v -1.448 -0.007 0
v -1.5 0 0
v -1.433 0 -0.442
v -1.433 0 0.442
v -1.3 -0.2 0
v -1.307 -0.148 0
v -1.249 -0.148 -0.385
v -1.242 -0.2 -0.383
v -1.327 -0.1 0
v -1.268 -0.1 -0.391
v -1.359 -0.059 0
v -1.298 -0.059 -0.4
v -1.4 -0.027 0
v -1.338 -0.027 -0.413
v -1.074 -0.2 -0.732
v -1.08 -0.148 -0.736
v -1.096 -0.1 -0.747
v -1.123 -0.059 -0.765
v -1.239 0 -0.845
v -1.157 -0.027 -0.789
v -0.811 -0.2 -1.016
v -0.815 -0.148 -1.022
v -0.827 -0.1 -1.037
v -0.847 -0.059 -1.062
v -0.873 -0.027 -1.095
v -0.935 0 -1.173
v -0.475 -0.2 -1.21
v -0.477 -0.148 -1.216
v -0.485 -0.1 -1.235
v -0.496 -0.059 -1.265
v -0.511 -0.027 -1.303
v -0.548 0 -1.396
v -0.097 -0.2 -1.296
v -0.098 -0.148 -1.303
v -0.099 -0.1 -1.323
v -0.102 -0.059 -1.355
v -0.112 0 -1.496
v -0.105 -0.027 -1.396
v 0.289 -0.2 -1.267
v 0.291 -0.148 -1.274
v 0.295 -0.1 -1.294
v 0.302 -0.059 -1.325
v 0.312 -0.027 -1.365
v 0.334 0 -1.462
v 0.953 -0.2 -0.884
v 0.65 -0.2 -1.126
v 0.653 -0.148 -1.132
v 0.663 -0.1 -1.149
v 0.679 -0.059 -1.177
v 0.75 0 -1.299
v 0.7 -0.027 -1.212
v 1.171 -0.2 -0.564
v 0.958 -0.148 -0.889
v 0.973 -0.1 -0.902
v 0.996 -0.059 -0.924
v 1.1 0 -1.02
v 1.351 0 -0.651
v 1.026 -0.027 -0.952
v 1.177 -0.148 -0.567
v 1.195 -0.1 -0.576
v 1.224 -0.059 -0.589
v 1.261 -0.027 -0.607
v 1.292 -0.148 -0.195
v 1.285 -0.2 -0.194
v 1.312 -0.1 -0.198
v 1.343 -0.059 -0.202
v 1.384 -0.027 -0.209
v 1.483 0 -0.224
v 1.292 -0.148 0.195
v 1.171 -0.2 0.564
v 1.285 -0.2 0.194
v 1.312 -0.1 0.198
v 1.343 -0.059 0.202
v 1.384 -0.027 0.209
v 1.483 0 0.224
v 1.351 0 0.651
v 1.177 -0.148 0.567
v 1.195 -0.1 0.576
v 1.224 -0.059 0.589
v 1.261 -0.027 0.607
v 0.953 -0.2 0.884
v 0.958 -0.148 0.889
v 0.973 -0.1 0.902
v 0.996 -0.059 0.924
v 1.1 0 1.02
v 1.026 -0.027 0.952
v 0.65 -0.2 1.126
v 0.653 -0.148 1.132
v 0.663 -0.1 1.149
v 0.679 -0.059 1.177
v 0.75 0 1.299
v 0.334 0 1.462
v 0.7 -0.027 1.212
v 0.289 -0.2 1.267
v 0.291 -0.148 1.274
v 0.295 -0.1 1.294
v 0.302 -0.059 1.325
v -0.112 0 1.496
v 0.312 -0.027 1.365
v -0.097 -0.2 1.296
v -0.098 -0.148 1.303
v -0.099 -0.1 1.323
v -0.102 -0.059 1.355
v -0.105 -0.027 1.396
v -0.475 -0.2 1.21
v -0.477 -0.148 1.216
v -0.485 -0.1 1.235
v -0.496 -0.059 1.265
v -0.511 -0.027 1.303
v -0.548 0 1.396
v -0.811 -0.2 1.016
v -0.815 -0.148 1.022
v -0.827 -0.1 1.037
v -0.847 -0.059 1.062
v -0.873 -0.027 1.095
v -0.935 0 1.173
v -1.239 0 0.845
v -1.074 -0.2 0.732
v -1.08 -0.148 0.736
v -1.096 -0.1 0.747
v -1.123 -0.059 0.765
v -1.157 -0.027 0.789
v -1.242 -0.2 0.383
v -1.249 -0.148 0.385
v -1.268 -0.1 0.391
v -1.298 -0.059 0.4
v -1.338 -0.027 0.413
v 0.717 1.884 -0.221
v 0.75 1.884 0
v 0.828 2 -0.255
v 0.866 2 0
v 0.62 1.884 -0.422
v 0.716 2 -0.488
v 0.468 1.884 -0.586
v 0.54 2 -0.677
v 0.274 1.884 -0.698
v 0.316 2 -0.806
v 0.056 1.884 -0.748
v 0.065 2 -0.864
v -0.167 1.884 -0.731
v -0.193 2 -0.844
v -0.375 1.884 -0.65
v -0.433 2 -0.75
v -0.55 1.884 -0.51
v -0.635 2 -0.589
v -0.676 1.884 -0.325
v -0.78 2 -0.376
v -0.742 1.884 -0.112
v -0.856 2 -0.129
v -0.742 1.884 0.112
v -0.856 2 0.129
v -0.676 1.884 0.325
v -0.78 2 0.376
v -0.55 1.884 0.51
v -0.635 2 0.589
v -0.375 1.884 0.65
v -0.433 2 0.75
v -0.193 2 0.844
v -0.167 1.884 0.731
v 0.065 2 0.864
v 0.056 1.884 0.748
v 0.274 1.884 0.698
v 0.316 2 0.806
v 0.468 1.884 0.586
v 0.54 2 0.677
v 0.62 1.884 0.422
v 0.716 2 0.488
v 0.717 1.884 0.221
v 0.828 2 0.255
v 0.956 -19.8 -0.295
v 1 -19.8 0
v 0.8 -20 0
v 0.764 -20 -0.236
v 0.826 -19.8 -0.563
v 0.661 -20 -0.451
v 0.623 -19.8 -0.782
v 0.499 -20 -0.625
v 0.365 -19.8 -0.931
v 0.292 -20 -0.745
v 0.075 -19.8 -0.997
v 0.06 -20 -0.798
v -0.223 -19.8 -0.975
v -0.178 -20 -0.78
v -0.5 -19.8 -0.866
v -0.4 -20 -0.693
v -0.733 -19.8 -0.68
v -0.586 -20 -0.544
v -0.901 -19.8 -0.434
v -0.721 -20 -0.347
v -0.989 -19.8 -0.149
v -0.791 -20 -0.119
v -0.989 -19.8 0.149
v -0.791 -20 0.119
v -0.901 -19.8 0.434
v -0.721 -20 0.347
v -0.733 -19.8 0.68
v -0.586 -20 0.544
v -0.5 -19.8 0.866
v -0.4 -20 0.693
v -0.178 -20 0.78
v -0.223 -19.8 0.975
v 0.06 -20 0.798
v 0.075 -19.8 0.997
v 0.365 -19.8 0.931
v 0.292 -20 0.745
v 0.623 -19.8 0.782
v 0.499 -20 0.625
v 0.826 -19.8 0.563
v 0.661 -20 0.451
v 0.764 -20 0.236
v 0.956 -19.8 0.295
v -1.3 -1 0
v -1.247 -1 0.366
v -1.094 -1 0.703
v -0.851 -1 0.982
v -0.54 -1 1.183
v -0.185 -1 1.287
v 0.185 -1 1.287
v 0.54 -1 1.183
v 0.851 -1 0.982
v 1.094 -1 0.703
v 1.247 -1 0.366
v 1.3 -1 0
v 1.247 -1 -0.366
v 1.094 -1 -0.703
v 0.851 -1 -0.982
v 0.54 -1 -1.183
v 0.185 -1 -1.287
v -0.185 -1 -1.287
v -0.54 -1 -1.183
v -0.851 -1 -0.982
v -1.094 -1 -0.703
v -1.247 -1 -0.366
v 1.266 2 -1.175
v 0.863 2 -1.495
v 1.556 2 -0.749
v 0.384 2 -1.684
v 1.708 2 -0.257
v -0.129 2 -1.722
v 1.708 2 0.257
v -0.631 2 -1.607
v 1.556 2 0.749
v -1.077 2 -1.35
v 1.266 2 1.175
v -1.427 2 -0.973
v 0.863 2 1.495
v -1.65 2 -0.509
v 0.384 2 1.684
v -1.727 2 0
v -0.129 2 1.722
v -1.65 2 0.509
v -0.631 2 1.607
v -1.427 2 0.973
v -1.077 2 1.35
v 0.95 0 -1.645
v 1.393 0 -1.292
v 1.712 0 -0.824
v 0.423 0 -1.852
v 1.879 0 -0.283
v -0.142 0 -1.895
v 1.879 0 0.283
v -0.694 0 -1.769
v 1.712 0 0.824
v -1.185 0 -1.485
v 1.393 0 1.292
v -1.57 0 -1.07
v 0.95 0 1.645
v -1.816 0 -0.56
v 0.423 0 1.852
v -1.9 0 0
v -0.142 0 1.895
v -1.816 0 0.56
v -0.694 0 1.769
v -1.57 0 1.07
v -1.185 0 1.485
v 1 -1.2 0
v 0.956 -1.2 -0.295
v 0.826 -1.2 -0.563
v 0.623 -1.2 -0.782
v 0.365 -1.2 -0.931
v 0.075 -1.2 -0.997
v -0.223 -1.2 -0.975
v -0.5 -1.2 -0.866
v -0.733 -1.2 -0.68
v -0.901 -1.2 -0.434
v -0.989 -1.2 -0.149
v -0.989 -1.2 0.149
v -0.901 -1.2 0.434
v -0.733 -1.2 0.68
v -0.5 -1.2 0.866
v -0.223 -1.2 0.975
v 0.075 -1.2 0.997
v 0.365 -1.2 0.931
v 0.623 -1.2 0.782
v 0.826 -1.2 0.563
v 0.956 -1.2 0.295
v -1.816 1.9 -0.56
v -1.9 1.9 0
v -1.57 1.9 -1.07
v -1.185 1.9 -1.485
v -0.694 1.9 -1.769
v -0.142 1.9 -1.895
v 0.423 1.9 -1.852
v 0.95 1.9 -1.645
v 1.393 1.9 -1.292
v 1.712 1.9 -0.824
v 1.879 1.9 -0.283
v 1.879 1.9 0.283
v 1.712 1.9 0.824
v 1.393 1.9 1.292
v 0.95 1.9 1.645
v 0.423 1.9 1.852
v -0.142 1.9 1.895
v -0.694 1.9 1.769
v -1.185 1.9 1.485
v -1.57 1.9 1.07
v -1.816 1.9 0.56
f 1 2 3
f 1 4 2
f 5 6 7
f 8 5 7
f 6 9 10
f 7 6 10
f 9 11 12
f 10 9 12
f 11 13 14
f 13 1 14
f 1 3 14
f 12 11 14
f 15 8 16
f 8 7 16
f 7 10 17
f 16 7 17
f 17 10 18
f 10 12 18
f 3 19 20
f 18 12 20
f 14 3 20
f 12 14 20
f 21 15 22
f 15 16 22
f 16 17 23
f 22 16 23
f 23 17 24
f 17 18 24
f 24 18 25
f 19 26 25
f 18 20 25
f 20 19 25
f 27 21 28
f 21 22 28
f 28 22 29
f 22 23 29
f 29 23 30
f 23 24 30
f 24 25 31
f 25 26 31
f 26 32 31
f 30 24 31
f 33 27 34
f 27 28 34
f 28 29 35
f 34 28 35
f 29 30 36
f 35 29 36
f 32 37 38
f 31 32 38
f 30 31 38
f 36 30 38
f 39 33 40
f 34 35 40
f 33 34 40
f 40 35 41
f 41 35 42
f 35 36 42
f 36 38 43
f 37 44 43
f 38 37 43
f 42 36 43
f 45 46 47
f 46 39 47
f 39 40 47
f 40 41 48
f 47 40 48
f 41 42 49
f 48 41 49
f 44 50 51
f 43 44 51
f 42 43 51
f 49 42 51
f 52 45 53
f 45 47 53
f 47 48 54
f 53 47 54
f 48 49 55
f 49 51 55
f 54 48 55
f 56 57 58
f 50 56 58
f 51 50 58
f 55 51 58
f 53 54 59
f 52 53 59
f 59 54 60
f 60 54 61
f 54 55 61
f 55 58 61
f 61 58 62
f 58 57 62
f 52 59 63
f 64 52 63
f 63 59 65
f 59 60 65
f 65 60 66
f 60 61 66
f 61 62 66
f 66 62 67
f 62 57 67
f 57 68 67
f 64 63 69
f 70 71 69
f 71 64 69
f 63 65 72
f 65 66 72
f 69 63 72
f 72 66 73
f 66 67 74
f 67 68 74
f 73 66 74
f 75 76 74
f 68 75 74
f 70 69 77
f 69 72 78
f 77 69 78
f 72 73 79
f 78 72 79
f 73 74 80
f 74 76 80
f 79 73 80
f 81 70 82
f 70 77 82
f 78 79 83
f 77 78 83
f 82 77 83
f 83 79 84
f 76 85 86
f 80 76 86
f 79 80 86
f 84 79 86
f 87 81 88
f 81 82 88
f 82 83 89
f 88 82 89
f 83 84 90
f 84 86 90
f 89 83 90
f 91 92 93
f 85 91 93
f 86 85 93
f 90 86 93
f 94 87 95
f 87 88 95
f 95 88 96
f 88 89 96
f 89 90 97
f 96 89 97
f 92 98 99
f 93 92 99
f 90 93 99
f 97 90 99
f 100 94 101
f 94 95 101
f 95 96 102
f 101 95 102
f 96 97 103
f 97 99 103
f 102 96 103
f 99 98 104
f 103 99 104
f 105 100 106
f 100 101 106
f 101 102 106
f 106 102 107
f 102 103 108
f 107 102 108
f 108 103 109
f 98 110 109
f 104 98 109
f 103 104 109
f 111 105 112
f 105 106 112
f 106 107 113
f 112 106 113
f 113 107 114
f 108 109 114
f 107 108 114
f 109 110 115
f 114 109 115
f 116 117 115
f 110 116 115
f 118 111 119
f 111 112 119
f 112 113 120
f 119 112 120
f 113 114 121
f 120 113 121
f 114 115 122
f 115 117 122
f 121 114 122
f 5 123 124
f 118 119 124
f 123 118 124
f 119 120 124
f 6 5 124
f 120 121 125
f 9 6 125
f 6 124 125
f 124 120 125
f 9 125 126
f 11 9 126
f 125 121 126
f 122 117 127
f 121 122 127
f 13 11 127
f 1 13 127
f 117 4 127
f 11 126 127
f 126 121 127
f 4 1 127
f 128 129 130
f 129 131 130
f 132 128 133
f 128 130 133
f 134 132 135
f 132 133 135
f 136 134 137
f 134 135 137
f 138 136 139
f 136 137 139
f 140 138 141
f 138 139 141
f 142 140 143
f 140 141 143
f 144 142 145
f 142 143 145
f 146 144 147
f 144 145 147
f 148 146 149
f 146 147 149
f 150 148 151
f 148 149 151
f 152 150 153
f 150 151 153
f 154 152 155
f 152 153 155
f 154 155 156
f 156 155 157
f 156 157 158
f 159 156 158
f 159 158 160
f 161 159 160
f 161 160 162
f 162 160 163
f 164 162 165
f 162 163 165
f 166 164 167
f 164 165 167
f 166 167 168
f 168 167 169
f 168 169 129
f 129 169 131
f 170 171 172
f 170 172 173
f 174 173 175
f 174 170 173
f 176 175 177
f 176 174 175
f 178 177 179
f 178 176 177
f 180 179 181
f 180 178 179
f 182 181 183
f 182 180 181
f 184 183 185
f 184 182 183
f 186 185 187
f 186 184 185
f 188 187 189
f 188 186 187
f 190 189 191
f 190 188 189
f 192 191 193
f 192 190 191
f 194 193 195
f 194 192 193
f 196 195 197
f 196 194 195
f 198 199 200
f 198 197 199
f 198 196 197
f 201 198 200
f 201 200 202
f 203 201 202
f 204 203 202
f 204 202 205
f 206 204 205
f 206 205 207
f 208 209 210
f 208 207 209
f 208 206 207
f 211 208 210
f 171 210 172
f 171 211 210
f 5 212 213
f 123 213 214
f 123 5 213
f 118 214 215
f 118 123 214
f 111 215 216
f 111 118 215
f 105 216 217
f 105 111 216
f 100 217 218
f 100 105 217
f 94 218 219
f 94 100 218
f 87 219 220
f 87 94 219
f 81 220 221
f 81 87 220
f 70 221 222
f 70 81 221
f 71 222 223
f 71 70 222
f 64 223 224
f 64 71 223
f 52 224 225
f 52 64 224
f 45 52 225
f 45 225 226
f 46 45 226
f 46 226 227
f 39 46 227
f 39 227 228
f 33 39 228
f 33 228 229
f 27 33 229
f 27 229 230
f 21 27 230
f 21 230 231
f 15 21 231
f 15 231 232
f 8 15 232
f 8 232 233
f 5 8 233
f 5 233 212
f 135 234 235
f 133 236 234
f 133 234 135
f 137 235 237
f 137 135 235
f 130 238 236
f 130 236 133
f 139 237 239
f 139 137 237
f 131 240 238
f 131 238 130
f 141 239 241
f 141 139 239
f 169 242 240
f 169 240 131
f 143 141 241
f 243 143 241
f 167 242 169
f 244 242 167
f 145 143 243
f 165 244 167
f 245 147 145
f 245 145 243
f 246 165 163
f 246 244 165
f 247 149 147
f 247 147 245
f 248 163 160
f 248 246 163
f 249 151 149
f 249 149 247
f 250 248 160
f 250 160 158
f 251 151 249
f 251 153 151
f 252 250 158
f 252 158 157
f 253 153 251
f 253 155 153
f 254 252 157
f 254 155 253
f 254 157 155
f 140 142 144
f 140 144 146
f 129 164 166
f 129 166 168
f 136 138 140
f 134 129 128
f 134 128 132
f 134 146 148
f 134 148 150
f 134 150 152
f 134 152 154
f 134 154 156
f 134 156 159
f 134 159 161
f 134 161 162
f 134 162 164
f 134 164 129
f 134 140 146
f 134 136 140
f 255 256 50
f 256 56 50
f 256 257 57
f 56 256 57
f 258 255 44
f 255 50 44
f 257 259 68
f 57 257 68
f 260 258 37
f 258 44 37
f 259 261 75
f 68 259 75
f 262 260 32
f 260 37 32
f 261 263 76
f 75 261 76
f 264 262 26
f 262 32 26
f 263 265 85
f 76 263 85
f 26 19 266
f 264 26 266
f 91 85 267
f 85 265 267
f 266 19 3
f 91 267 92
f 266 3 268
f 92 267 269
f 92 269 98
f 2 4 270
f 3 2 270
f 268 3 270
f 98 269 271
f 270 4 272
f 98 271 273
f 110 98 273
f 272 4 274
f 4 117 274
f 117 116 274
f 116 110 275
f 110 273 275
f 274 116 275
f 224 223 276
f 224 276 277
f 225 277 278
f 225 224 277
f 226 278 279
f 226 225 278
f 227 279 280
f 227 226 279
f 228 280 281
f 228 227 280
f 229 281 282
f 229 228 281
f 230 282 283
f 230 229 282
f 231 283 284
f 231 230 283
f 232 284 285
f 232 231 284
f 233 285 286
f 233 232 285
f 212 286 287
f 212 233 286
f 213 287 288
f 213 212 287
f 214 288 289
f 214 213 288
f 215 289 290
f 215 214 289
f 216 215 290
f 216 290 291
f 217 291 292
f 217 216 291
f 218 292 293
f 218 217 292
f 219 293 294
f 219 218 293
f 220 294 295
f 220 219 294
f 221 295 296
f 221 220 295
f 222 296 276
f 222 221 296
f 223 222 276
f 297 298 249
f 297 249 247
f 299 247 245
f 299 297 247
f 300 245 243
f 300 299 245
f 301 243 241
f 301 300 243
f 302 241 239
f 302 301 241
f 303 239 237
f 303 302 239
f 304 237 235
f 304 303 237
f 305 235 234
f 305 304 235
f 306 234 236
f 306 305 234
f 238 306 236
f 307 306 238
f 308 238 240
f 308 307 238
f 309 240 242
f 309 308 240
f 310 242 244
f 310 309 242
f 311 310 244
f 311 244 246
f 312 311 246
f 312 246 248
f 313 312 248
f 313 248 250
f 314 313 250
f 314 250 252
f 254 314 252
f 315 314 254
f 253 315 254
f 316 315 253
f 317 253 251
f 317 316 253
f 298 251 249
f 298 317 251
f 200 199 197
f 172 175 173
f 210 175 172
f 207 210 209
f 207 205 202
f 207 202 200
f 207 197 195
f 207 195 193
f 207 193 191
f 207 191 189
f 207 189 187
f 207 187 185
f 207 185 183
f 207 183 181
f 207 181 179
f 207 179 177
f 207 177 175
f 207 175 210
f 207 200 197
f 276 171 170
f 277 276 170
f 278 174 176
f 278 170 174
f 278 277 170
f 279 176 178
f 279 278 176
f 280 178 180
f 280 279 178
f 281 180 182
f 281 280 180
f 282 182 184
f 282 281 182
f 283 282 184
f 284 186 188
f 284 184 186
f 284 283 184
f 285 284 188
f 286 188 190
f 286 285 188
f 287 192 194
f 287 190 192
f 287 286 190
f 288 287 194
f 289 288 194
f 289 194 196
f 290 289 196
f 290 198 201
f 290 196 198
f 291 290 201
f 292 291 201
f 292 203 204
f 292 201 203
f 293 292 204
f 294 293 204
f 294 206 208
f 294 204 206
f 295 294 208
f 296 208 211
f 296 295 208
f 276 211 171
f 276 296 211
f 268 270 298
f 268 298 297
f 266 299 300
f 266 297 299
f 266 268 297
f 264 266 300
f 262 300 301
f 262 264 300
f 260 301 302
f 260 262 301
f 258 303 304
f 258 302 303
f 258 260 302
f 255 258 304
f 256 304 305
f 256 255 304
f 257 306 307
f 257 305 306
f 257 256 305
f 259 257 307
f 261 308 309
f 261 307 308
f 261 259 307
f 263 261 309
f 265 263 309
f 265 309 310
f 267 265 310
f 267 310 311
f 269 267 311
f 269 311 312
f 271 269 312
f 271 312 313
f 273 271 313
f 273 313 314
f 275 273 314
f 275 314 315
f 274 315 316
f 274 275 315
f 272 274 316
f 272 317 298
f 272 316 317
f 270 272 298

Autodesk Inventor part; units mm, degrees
ref_plane "YZ Plane" through (0, 0, 0) normal (1, 0, 0) x (0, 1, 0)
sketch "Sketch11" plane through (0, 0, 0) normal (0, 1, 0) x (-1, 0, 0)
  circle A0 centre (0, 0) radius 1.9
  dimension "d86" = 3.8
sketch "Sketch12" plane through (0, 0, 0) normal (0, 1, 0) x (-1, 0, 0)
  circle A0 centre (0, 0) radius 1.3
  dimension "d87" = 2.6
ref_plane "Work Plane4" through (0, 2, 0) normal (0, 1, 0) x (-1, 0, 0)
ref_plane "Work Plane5" through (0, 1.9, 0) normal (0, 1, 0) x (-1, 0, 0)
extrude "Head" add sketch "Sketch11" along normal blind 2
chamfer "Chamfer3" distance 0.1 angle 60 1 edges at (1.9, 2, 0) measured on face at (-1.8938, 1.3333, -0.1529)
sketch "Sketch6" plane through (0, 1.9, 0) normal (0, 1, 0) x (1, 0, 0)
  line L0 (0, 0) -> (-1.9, 0) construction
  line L1 (0, 0) -> (-2, 0) construction
  line L2 (-2, 0) -> (-2, 0.2)
  line L3 (-2, 0) -> (-2, -0.2)
  line L4 (-2, -0.2) -> (-1.8894, -0.2)
  line L5 (-2, 0.2) -> (-1.8894, 0.2)
  line L6 (-1.8894, -0.2) -> (-1.8894, 0.2)
  circle A0 centre (0, 0) radius 1.9 construction
  dimension "d34" = 1.9
  dimension "d35" = 2
  dimension "d36" = 0.2
  dimension "d37" = 0.2
  dimension "d40" = 0.1106
  dimension "d75" = 3.8
extrude "Grip Knurling" [suppressed]
fillet "Fillet3" [suppressed]
pattern_circular "Circular Pattern1" [suppressed]
pattern_circular "Circular Pattern2" [suppressed]
sketch "Label" plane through (0, 2, 0) normal (0, 1, 0) x (-1, 0, 0)
  circle A0 centre (0, 0) radius 0.866
  circle A1 centre (0, 0) radius 1.7268 projected
  dimension "shaftDiameter" = 2
  dimension "transitionDiameter" = 2.6
  dimension "d109" = 1.7321
feature "Bolt Designation" [suppressed]
sketch "Sketch2" plane through (0, 2, 0) normal (0, 1, 0) x (1, 0, 0)
  line L0 (0.75, -0.433) -> (0, -0.866)
  line L1 (0, -0.866) -> (-0.75, -0.433)
  line L2 (-0.75, -0.433) -> (-0.75, 0.433)
  line L3 (-0.75, 0.433) -> (0, 0.866)
  line L4 (0, 0.866) -> (0.75, 0.433)
  line L5 (0.75, 0.433) -> (0.75, -0.433)
  line L6 (-0.75, -0.433) -> (0.75, 0.433) construction
  point P0 (0, 0)
  point P1 (0, 0)
  dimension "d8" = 1.5
  dimension "d24" = 1.7321
  dimension "d85" = 0.866
extrude "HexagonSocket" [suppressed]
sketch "Sketch4" plane through (0, 2, 0) normal (0, 1, 0) x (1, 0, 0)
  circle A0 centre (0, 0) radius 0.866
  dimension "d25" = 1.7321
extrude "Socket_topTaper" cut sketch "Sketch4" against normal blind 0.116 draft -45
ref_plane "Work Plane8" through (0, 0.8, 0) normal (0, 1, 0) x (1, 0, 0)
sketch "Sketch10" plane through (0, 0.8, 0) normal (0, 1, 0) x (1, 0, 0)
  circle A0 centre (0, 0) radius 0.433
  dimension "d70" = 0.866
feature "Socket_bottomTaper" [suppressed]
extrude "Transition" add sketch "Sketch12" against normal blind 1
ref_plane "Work Plane9" through (0, -1, 0) normal (0, 1, 0) x (-1, 0, 0)
sketch "Sketch18" plane through (0, -1, 0) normal (0, -1, 0) x (1, 0, 0)
  circle A0 centre (0, 0) radius 1.3 projected
extrude "Extruded Angle" add sketch "Sketch18" along normal blind 0.2 draft -56.31
sketch "Sketch19" plane through (0, -1.2, 0) normal (0, -1, 0) x (1, 0, 0)
  circle A0 centre (0, 0) radius 1 projected
sketch "Sketch13" plane through (0, -1, 0) normal (0, -1, 0) x (1, 0, 0)
  circle A0 centre (0, 0) radius 1
  dimension "d92" = 2
extrude "Shaft" add sketch "Sketch13" along normal blind 19
fillet "Fillet4" radius 0.2 1 edges at (1.3, 0, 0)
chamfer "Chamfer4" distance 0.2 angle 45 1 edges at (-1, -20, 0)
thread "Thread1" size "M2x0.4" class "6g" standard "ISO Metric profile" full length
sketch "Sketch7" plane through (0, 0, 0) normal (0, 0, 1) x (1, 0, 0)
  line L0 (-1, 0.2) -> (1, 0.2) construction
  line L1 (-1, -20.4) -> (-0.7393, -20.5505)
  line L2 (-0.7393, -20.6495) -> (-1, -20.8)
  line L3 (-1, -20.8) -> (-1, -20.4)
  arc A0 (-0.7393, -20.6495) -> (-0.7393, -20.5505) centre (-0.7679, -20.6) ccw
  line L4 (-1, -19.8) -> (1, -19.8) projected
  point P0 (0, 0)
  point P1 (-0.8845, -20.6)
  point P2 (-0.6536, -20.6)
  dimension "d53" = 0.4
  dimension "d56" = 0.0571
  dimension "d124" = 0.6
  dimension "d125" = 0
feature "ModeledThreads" [suppressed]
extrude "Extrusion10" add sketch "Sketch19" against normal blind 1
equation "\"shaftDiameter\" = 2"
equation "\"transitionDiameter\" = 2.6"
equation "\"flangeCoupling_height\" = flangeCoupling_collarHeight + flangeCoupling_flangeHeight"
equation "\"headHeight\" = 2"
equation "\"headDiameter\" = 3.8"
equation "\"gap\" = 0.1"
equation "\"airgap\" = 0.4"
equation "\"wallgap\" = 2"
equation "\"printingLayerHeight\" = 0.2"
equation "\"driveMagnet_height\" = 5"
equation "\"halbachMagnet_height\" = 3"
equation "\"rotorBandBolt_diameter\" = 2"
equation "\"rotorBandBolt_headDiameter\" = 3.98"
equation "\"rotorBandBolt_headHeight\" = 2"
equation "\"rotorBandHexNut_sideToSide\" = 4"
equation "\"rotorBandHexNut_height\" = 1.2"
equation "\"rotorBandSquareNut_sideLength\" = 4"
equation "\"rotorBandSquareNut_height\" = 1.2"
equation "\"sensorMagnet_diameter\" = 5"
equation "\"sensorMagnet_height\" = 2.66667"
equation "\"sensorMagnet_ringRadius\" = 0.5 * driveMagnet_centerSpacingRadius + 2 * wallgap"
equation "\"rotorRadius\" = 2 * gap + driveMagnet_centerSpacingRadius + driveMagnet_length + wallgap"
equation "\"rotor_mountingLipHeight\" = 0.5 * statorThickness"
equation "\"flangeBearing_innerDiameter\" = shaftDiameter"
equation "\"flangeBearing_outerDiameter\" = 16"
equation "\"flangeBearing_flangeDiameter\" = 18"
equation "\"flangeBearing_height\" = 5"
equation "\"flangeBearing_flangeHeight\" = 1"
equation "\"magnetWire_outerDiameter\" = 0.8128"
equation "\"coilThickness\" = 12"
equation "\"statorThickness\" = coilThickness + 2 * wallgap"
equation "\"rotorBandThickness\" = wallgap + rotorBandBolt_headHeight + gap"
equation "\"flangeCoupling_innerDiameter\" = shaftDiameter"
equation "\"flangeCoupling_collarOuterDiameter\" = 16"
equation "\"flangeCoupling_flangeDiameter\" = 32"
equation "\"flangeCoupling_flangeHeight\" = 3.1"
equation "\"flangeCoupling_mountHoleDiameter\" = 3.9"
equation "\"flangeCoupling_mountHoleEdgeToEdge\" = 2.05"
equation "\"statorRadius\" = driveMagnet_length + driveMagnet_centerSpacingRadius + 2 * gap"
equation "\"statorMountBolt_diameter\" = 4"
equation "\"statorMountBolt_headDiameter\" = 7"
equation "\"statorMountBolt_headHeight\" = 4"
equation "\"statorMountBolt_shaftLength\" = coilThickness + flangeCoupling_flangeHeight + wallgap"
equation "\"statorMountHexNut_sideToSide\" = 8"
equation "\"statorMountHexNut_height\" = 4"
equation "\"coil_percentCoverage\" = 0.6"
equation "\"statorSpokeDegrees\" = 4deg"
equation "\"statorCoilBolt_diameter\" = 2"
equation "\"statorCoilBolt_headDiameter\" = 3.98"
equation "\"statorCoilBolt_headHeight\" = 2"
equation "\"statorCoilBolt_shaftLength\" = coilThickness"
equation "\"statorCoilHexNut_sideToSide\" = 4"
equation "\"statorCoilHexNut_height\" = 1.2"
equation "\"circuitBoard_height\" = 1.6"
equation "\"hallEffectSensor_height\" = 1.1"
equation "\"hallEffectSensor_length\" = 3"
equation "\"hallEffectSensor_width\" = 1.6"
equation "\"hallEffectSensor_pinLength\" = 0.6"
equation "\"circuitboardMountBolt_diameter\" = 2"
equation "\"circuitboardMountBolt_headDiameter\" = 3.98"
equation "\"circuitboardMountBolt_headHeight\" = 2"
equation "\"circuitboardMountBolt_shaftLength\" = coilThickness"
equation "\"circuitboardMountHexNut_sideToSide\" = 4"
equation "\"circuitboardMountHexNut_height\" = 1.2"
equation "\"statorShellBolt_diameter\" = 3"
equation "\"statorShellBolt_headDiameter\" = 5.68"
equation "\"statorShellBolt_headHeight\" = 3"
equation "\"statorShellBolt_shaftLength\" = statorThickness - statorShellBolt_countersinkDepth"
equation "\"statorShellHexNut_sideToSide\" = 5.3"
equation "\"statorShellHexNut_height\" = 2.3"
equation "\"threadPitch\" = 0.4"
equation "\"socketSize\" = 1.5"
equation "\"chamferSize\" = 0.2"
equation "\"keyEngagementDepth\" = 1"
equation "\"transitionLength\" = 1"
equation "\"textSize\" = 0.95"
equation "\"flangeCoupling_collarHeight\" = 10"
equation "\"driveMagnet_centerSpacingRadius\" = 38.96113"
equation "\"driveMagnet_length\" = 60"
equation "\"statorShellBolt_countersinkDepth\" = 3.4"
properties part number "M2" material "Steel, Galvanized"
